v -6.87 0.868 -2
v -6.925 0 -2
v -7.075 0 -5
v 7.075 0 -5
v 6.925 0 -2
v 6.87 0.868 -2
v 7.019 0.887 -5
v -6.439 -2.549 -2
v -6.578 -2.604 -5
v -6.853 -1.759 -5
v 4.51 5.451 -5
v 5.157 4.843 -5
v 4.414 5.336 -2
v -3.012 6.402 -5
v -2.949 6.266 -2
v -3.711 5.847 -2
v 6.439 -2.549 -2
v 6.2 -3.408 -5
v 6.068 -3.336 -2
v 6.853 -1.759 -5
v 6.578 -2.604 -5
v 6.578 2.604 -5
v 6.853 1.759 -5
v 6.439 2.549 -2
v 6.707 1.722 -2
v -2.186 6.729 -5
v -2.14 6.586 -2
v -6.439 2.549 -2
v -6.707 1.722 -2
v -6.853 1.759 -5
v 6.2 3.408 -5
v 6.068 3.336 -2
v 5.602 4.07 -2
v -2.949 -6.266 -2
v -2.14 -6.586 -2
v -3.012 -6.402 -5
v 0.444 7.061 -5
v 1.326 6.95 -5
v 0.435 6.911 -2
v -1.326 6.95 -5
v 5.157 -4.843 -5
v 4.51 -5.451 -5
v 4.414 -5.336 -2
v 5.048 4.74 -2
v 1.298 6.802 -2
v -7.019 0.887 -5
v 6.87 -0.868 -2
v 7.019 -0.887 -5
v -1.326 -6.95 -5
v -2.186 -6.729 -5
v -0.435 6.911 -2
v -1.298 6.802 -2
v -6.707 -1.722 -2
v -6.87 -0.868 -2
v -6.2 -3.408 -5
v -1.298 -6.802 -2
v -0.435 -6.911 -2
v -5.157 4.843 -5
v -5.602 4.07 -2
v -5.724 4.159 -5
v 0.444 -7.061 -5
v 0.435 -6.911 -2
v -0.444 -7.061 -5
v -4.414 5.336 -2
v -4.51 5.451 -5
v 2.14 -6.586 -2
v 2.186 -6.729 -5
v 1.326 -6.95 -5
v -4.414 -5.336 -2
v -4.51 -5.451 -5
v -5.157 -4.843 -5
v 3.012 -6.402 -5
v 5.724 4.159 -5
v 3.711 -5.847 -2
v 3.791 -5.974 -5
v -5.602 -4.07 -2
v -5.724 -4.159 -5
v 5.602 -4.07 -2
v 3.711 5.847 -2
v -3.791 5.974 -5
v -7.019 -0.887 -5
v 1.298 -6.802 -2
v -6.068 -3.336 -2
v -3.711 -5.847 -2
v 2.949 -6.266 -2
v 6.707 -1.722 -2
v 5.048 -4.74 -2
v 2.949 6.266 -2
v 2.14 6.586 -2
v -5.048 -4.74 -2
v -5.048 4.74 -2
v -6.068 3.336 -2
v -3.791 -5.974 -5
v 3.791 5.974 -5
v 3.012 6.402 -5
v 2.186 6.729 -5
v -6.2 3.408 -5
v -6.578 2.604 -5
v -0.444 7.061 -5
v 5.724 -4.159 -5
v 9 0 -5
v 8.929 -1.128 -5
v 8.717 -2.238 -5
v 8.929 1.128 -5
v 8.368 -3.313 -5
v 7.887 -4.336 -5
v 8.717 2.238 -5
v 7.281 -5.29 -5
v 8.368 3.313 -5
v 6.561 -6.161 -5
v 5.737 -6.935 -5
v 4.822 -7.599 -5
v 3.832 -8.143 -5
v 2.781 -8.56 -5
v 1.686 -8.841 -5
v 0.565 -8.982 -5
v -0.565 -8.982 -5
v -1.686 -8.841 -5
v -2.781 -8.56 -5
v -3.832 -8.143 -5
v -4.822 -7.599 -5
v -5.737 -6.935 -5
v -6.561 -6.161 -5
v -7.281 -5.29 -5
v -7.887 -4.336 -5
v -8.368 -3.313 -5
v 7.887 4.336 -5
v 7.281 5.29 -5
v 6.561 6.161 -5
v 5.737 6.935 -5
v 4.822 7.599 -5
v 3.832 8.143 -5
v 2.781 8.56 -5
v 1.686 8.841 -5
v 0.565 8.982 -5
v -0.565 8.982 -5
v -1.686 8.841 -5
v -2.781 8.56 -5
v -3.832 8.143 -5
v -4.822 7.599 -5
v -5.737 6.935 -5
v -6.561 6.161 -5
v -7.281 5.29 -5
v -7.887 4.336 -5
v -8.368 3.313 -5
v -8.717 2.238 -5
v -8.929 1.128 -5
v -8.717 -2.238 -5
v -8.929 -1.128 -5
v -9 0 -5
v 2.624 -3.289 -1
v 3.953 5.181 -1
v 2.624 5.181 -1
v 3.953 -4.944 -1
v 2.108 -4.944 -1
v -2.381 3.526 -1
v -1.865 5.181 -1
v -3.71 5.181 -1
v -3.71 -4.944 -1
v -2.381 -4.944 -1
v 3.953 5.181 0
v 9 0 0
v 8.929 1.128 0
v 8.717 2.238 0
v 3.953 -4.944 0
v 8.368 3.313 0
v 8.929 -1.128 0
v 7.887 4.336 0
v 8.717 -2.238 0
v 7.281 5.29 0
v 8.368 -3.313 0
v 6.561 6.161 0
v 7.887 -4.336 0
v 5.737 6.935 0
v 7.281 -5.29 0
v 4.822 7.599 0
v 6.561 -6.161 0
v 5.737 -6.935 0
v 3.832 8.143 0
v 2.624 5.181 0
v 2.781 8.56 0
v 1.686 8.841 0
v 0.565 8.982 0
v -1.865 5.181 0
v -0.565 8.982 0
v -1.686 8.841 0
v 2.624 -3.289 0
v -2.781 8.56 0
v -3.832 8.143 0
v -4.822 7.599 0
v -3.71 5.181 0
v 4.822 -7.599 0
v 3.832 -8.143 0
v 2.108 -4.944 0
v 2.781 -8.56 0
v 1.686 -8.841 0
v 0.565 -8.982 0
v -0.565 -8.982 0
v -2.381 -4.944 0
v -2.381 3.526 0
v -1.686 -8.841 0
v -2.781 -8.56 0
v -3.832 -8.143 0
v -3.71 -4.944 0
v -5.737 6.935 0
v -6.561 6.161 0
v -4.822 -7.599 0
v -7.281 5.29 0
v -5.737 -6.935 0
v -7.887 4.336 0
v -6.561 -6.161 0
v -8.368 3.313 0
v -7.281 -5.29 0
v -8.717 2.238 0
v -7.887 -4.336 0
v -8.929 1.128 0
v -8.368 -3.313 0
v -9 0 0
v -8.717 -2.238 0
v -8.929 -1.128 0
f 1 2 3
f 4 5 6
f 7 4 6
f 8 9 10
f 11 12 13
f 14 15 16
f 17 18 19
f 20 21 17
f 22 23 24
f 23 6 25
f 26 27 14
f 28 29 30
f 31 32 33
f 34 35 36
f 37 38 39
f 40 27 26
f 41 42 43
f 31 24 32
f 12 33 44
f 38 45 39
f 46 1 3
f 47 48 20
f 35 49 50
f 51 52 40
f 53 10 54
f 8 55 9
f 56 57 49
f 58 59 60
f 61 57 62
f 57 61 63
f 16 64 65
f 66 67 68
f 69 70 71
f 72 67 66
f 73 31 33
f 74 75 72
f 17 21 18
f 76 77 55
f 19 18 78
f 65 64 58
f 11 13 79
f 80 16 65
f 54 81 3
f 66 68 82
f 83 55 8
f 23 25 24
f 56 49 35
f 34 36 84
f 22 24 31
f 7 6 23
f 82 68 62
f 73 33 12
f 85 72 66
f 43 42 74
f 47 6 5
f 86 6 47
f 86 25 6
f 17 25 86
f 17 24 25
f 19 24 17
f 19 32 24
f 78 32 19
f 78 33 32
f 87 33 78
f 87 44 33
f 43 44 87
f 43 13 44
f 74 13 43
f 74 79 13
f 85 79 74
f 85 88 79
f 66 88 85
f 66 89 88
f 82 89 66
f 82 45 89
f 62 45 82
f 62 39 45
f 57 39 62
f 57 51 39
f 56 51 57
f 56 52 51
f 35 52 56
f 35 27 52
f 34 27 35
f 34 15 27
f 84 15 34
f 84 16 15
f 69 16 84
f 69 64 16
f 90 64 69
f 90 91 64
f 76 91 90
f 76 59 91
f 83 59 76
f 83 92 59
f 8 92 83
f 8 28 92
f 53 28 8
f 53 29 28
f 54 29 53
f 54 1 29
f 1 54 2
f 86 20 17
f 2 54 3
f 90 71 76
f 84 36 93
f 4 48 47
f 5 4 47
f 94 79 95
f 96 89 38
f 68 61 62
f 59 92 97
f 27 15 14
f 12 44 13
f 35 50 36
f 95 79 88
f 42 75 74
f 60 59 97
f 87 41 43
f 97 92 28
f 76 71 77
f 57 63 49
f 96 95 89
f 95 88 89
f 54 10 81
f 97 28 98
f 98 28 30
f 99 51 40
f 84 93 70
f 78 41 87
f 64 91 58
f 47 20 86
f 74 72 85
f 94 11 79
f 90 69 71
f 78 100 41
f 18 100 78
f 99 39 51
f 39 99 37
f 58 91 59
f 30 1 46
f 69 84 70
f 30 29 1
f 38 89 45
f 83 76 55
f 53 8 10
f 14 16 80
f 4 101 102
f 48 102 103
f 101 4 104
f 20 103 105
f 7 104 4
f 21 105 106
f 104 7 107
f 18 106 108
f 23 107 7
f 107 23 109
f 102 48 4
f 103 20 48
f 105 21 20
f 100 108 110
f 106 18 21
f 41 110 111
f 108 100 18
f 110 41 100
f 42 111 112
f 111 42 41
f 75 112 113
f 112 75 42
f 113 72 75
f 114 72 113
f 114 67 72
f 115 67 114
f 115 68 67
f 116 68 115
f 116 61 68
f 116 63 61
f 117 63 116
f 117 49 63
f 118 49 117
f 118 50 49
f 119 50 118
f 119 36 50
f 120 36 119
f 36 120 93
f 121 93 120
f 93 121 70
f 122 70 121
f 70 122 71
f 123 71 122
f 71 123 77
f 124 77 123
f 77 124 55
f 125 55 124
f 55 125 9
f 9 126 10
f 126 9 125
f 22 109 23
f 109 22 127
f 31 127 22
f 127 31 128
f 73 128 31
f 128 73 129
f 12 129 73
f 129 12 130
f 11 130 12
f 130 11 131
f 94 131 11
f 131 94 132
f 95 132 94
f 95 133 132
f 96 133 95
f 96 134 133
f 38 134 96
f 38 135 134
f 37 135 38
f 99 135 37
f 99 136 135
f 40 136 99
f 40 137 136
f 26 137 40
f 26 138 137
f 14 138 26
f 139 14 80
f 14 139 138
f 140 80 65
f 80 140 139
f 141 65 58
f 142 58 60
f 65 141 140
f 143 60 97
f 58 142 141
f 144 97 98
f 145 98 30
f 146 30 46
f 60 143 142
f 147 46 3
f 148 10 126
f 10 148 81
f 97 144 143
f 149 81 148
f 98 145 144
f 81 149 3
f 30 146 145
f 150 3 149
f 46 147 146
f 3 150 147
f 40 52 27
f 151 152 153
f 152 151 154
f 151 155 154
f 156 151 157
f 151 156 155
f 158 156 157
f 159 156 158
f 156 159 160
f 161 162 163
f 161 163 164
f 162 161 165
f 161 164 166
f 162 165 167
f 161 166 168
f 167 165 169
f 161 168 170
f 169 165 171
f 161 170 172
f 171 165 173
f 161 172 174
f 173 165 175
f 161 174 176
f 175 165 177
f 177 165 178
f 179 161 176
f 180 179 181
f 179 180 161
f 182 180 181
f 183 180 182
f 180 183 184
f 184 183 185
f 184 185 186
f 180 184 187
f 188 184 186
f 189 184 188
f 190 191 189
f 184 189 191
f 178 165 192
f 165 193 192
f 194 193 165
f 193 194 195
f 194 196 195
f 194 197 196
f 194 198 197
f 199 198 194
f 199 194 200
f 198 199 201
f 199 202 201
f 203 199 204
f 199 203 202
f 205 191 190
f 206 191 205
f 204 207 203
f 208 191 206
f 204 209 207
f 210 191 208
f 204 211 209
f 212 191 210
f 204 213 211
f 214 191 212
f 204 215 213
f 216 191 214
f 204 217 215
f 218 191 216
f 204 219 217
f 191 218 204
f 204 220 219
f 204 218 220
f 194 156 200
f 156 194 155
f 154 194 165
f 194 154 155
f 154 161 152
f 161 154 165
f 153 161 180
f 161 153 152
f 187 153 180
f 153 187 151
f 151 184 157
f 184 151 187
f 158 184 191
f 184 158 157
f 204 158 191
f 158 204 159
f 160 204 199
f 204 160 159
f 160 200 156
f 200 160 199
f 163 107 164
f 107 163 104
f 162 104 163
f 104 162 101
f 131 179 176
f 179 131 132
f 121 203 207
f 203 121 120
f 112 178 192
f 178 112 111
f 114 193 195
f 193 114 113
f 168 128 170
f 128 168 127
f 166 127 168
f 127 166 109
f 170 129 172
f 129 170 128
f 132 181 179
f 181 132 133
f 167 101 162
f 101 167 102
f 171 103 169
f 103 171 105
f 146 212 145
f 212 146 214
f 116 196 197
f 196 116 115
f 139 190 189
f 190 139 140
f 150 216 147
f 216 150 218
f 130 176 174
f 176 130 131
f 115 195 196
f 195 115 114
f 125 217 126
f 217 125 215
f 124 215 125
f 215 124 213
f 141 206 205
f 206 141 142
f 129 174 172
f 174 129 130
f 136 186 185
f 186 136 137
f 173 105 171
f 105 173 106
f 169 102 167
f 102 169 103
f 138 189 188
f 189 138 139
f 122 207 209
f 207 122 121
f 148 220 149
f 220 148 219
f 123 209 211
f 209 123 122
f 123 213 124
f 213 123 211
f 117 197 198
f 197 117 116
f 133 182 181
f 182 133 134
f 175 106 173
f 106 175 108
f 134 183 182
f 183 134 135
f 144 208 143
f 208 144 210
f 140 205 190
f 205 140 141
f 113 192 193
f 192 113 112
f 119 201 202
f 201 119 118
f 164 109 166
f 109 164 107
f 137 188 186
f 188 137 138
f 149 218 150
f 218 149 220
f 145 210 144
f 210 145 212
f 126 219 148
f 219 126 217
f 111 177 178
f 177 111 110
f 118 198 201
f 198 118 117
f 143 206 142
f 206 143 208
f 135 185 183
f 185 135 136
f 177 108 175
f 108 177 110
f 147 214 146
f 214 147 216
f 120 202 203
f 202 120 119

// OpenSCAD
$fn = 50;

difference() {
	union() {
		translate(v = [0, 0, -5.0]) {
			cylinder(h = 5, r = 9.0);
		}
	}
	union() {
		#translate(v = [0, 0, -5.0]) {
			cylinder(h = 3, r1 = 7.075, r2 = 6.925);
		}
		translate(v = [0, 0, -1]) {
			linear_extrude(height = 1) {
				text(font = "Impact", halign = "center", size = 10, text = "N", valign = "center");
			}
		}
	}
}
